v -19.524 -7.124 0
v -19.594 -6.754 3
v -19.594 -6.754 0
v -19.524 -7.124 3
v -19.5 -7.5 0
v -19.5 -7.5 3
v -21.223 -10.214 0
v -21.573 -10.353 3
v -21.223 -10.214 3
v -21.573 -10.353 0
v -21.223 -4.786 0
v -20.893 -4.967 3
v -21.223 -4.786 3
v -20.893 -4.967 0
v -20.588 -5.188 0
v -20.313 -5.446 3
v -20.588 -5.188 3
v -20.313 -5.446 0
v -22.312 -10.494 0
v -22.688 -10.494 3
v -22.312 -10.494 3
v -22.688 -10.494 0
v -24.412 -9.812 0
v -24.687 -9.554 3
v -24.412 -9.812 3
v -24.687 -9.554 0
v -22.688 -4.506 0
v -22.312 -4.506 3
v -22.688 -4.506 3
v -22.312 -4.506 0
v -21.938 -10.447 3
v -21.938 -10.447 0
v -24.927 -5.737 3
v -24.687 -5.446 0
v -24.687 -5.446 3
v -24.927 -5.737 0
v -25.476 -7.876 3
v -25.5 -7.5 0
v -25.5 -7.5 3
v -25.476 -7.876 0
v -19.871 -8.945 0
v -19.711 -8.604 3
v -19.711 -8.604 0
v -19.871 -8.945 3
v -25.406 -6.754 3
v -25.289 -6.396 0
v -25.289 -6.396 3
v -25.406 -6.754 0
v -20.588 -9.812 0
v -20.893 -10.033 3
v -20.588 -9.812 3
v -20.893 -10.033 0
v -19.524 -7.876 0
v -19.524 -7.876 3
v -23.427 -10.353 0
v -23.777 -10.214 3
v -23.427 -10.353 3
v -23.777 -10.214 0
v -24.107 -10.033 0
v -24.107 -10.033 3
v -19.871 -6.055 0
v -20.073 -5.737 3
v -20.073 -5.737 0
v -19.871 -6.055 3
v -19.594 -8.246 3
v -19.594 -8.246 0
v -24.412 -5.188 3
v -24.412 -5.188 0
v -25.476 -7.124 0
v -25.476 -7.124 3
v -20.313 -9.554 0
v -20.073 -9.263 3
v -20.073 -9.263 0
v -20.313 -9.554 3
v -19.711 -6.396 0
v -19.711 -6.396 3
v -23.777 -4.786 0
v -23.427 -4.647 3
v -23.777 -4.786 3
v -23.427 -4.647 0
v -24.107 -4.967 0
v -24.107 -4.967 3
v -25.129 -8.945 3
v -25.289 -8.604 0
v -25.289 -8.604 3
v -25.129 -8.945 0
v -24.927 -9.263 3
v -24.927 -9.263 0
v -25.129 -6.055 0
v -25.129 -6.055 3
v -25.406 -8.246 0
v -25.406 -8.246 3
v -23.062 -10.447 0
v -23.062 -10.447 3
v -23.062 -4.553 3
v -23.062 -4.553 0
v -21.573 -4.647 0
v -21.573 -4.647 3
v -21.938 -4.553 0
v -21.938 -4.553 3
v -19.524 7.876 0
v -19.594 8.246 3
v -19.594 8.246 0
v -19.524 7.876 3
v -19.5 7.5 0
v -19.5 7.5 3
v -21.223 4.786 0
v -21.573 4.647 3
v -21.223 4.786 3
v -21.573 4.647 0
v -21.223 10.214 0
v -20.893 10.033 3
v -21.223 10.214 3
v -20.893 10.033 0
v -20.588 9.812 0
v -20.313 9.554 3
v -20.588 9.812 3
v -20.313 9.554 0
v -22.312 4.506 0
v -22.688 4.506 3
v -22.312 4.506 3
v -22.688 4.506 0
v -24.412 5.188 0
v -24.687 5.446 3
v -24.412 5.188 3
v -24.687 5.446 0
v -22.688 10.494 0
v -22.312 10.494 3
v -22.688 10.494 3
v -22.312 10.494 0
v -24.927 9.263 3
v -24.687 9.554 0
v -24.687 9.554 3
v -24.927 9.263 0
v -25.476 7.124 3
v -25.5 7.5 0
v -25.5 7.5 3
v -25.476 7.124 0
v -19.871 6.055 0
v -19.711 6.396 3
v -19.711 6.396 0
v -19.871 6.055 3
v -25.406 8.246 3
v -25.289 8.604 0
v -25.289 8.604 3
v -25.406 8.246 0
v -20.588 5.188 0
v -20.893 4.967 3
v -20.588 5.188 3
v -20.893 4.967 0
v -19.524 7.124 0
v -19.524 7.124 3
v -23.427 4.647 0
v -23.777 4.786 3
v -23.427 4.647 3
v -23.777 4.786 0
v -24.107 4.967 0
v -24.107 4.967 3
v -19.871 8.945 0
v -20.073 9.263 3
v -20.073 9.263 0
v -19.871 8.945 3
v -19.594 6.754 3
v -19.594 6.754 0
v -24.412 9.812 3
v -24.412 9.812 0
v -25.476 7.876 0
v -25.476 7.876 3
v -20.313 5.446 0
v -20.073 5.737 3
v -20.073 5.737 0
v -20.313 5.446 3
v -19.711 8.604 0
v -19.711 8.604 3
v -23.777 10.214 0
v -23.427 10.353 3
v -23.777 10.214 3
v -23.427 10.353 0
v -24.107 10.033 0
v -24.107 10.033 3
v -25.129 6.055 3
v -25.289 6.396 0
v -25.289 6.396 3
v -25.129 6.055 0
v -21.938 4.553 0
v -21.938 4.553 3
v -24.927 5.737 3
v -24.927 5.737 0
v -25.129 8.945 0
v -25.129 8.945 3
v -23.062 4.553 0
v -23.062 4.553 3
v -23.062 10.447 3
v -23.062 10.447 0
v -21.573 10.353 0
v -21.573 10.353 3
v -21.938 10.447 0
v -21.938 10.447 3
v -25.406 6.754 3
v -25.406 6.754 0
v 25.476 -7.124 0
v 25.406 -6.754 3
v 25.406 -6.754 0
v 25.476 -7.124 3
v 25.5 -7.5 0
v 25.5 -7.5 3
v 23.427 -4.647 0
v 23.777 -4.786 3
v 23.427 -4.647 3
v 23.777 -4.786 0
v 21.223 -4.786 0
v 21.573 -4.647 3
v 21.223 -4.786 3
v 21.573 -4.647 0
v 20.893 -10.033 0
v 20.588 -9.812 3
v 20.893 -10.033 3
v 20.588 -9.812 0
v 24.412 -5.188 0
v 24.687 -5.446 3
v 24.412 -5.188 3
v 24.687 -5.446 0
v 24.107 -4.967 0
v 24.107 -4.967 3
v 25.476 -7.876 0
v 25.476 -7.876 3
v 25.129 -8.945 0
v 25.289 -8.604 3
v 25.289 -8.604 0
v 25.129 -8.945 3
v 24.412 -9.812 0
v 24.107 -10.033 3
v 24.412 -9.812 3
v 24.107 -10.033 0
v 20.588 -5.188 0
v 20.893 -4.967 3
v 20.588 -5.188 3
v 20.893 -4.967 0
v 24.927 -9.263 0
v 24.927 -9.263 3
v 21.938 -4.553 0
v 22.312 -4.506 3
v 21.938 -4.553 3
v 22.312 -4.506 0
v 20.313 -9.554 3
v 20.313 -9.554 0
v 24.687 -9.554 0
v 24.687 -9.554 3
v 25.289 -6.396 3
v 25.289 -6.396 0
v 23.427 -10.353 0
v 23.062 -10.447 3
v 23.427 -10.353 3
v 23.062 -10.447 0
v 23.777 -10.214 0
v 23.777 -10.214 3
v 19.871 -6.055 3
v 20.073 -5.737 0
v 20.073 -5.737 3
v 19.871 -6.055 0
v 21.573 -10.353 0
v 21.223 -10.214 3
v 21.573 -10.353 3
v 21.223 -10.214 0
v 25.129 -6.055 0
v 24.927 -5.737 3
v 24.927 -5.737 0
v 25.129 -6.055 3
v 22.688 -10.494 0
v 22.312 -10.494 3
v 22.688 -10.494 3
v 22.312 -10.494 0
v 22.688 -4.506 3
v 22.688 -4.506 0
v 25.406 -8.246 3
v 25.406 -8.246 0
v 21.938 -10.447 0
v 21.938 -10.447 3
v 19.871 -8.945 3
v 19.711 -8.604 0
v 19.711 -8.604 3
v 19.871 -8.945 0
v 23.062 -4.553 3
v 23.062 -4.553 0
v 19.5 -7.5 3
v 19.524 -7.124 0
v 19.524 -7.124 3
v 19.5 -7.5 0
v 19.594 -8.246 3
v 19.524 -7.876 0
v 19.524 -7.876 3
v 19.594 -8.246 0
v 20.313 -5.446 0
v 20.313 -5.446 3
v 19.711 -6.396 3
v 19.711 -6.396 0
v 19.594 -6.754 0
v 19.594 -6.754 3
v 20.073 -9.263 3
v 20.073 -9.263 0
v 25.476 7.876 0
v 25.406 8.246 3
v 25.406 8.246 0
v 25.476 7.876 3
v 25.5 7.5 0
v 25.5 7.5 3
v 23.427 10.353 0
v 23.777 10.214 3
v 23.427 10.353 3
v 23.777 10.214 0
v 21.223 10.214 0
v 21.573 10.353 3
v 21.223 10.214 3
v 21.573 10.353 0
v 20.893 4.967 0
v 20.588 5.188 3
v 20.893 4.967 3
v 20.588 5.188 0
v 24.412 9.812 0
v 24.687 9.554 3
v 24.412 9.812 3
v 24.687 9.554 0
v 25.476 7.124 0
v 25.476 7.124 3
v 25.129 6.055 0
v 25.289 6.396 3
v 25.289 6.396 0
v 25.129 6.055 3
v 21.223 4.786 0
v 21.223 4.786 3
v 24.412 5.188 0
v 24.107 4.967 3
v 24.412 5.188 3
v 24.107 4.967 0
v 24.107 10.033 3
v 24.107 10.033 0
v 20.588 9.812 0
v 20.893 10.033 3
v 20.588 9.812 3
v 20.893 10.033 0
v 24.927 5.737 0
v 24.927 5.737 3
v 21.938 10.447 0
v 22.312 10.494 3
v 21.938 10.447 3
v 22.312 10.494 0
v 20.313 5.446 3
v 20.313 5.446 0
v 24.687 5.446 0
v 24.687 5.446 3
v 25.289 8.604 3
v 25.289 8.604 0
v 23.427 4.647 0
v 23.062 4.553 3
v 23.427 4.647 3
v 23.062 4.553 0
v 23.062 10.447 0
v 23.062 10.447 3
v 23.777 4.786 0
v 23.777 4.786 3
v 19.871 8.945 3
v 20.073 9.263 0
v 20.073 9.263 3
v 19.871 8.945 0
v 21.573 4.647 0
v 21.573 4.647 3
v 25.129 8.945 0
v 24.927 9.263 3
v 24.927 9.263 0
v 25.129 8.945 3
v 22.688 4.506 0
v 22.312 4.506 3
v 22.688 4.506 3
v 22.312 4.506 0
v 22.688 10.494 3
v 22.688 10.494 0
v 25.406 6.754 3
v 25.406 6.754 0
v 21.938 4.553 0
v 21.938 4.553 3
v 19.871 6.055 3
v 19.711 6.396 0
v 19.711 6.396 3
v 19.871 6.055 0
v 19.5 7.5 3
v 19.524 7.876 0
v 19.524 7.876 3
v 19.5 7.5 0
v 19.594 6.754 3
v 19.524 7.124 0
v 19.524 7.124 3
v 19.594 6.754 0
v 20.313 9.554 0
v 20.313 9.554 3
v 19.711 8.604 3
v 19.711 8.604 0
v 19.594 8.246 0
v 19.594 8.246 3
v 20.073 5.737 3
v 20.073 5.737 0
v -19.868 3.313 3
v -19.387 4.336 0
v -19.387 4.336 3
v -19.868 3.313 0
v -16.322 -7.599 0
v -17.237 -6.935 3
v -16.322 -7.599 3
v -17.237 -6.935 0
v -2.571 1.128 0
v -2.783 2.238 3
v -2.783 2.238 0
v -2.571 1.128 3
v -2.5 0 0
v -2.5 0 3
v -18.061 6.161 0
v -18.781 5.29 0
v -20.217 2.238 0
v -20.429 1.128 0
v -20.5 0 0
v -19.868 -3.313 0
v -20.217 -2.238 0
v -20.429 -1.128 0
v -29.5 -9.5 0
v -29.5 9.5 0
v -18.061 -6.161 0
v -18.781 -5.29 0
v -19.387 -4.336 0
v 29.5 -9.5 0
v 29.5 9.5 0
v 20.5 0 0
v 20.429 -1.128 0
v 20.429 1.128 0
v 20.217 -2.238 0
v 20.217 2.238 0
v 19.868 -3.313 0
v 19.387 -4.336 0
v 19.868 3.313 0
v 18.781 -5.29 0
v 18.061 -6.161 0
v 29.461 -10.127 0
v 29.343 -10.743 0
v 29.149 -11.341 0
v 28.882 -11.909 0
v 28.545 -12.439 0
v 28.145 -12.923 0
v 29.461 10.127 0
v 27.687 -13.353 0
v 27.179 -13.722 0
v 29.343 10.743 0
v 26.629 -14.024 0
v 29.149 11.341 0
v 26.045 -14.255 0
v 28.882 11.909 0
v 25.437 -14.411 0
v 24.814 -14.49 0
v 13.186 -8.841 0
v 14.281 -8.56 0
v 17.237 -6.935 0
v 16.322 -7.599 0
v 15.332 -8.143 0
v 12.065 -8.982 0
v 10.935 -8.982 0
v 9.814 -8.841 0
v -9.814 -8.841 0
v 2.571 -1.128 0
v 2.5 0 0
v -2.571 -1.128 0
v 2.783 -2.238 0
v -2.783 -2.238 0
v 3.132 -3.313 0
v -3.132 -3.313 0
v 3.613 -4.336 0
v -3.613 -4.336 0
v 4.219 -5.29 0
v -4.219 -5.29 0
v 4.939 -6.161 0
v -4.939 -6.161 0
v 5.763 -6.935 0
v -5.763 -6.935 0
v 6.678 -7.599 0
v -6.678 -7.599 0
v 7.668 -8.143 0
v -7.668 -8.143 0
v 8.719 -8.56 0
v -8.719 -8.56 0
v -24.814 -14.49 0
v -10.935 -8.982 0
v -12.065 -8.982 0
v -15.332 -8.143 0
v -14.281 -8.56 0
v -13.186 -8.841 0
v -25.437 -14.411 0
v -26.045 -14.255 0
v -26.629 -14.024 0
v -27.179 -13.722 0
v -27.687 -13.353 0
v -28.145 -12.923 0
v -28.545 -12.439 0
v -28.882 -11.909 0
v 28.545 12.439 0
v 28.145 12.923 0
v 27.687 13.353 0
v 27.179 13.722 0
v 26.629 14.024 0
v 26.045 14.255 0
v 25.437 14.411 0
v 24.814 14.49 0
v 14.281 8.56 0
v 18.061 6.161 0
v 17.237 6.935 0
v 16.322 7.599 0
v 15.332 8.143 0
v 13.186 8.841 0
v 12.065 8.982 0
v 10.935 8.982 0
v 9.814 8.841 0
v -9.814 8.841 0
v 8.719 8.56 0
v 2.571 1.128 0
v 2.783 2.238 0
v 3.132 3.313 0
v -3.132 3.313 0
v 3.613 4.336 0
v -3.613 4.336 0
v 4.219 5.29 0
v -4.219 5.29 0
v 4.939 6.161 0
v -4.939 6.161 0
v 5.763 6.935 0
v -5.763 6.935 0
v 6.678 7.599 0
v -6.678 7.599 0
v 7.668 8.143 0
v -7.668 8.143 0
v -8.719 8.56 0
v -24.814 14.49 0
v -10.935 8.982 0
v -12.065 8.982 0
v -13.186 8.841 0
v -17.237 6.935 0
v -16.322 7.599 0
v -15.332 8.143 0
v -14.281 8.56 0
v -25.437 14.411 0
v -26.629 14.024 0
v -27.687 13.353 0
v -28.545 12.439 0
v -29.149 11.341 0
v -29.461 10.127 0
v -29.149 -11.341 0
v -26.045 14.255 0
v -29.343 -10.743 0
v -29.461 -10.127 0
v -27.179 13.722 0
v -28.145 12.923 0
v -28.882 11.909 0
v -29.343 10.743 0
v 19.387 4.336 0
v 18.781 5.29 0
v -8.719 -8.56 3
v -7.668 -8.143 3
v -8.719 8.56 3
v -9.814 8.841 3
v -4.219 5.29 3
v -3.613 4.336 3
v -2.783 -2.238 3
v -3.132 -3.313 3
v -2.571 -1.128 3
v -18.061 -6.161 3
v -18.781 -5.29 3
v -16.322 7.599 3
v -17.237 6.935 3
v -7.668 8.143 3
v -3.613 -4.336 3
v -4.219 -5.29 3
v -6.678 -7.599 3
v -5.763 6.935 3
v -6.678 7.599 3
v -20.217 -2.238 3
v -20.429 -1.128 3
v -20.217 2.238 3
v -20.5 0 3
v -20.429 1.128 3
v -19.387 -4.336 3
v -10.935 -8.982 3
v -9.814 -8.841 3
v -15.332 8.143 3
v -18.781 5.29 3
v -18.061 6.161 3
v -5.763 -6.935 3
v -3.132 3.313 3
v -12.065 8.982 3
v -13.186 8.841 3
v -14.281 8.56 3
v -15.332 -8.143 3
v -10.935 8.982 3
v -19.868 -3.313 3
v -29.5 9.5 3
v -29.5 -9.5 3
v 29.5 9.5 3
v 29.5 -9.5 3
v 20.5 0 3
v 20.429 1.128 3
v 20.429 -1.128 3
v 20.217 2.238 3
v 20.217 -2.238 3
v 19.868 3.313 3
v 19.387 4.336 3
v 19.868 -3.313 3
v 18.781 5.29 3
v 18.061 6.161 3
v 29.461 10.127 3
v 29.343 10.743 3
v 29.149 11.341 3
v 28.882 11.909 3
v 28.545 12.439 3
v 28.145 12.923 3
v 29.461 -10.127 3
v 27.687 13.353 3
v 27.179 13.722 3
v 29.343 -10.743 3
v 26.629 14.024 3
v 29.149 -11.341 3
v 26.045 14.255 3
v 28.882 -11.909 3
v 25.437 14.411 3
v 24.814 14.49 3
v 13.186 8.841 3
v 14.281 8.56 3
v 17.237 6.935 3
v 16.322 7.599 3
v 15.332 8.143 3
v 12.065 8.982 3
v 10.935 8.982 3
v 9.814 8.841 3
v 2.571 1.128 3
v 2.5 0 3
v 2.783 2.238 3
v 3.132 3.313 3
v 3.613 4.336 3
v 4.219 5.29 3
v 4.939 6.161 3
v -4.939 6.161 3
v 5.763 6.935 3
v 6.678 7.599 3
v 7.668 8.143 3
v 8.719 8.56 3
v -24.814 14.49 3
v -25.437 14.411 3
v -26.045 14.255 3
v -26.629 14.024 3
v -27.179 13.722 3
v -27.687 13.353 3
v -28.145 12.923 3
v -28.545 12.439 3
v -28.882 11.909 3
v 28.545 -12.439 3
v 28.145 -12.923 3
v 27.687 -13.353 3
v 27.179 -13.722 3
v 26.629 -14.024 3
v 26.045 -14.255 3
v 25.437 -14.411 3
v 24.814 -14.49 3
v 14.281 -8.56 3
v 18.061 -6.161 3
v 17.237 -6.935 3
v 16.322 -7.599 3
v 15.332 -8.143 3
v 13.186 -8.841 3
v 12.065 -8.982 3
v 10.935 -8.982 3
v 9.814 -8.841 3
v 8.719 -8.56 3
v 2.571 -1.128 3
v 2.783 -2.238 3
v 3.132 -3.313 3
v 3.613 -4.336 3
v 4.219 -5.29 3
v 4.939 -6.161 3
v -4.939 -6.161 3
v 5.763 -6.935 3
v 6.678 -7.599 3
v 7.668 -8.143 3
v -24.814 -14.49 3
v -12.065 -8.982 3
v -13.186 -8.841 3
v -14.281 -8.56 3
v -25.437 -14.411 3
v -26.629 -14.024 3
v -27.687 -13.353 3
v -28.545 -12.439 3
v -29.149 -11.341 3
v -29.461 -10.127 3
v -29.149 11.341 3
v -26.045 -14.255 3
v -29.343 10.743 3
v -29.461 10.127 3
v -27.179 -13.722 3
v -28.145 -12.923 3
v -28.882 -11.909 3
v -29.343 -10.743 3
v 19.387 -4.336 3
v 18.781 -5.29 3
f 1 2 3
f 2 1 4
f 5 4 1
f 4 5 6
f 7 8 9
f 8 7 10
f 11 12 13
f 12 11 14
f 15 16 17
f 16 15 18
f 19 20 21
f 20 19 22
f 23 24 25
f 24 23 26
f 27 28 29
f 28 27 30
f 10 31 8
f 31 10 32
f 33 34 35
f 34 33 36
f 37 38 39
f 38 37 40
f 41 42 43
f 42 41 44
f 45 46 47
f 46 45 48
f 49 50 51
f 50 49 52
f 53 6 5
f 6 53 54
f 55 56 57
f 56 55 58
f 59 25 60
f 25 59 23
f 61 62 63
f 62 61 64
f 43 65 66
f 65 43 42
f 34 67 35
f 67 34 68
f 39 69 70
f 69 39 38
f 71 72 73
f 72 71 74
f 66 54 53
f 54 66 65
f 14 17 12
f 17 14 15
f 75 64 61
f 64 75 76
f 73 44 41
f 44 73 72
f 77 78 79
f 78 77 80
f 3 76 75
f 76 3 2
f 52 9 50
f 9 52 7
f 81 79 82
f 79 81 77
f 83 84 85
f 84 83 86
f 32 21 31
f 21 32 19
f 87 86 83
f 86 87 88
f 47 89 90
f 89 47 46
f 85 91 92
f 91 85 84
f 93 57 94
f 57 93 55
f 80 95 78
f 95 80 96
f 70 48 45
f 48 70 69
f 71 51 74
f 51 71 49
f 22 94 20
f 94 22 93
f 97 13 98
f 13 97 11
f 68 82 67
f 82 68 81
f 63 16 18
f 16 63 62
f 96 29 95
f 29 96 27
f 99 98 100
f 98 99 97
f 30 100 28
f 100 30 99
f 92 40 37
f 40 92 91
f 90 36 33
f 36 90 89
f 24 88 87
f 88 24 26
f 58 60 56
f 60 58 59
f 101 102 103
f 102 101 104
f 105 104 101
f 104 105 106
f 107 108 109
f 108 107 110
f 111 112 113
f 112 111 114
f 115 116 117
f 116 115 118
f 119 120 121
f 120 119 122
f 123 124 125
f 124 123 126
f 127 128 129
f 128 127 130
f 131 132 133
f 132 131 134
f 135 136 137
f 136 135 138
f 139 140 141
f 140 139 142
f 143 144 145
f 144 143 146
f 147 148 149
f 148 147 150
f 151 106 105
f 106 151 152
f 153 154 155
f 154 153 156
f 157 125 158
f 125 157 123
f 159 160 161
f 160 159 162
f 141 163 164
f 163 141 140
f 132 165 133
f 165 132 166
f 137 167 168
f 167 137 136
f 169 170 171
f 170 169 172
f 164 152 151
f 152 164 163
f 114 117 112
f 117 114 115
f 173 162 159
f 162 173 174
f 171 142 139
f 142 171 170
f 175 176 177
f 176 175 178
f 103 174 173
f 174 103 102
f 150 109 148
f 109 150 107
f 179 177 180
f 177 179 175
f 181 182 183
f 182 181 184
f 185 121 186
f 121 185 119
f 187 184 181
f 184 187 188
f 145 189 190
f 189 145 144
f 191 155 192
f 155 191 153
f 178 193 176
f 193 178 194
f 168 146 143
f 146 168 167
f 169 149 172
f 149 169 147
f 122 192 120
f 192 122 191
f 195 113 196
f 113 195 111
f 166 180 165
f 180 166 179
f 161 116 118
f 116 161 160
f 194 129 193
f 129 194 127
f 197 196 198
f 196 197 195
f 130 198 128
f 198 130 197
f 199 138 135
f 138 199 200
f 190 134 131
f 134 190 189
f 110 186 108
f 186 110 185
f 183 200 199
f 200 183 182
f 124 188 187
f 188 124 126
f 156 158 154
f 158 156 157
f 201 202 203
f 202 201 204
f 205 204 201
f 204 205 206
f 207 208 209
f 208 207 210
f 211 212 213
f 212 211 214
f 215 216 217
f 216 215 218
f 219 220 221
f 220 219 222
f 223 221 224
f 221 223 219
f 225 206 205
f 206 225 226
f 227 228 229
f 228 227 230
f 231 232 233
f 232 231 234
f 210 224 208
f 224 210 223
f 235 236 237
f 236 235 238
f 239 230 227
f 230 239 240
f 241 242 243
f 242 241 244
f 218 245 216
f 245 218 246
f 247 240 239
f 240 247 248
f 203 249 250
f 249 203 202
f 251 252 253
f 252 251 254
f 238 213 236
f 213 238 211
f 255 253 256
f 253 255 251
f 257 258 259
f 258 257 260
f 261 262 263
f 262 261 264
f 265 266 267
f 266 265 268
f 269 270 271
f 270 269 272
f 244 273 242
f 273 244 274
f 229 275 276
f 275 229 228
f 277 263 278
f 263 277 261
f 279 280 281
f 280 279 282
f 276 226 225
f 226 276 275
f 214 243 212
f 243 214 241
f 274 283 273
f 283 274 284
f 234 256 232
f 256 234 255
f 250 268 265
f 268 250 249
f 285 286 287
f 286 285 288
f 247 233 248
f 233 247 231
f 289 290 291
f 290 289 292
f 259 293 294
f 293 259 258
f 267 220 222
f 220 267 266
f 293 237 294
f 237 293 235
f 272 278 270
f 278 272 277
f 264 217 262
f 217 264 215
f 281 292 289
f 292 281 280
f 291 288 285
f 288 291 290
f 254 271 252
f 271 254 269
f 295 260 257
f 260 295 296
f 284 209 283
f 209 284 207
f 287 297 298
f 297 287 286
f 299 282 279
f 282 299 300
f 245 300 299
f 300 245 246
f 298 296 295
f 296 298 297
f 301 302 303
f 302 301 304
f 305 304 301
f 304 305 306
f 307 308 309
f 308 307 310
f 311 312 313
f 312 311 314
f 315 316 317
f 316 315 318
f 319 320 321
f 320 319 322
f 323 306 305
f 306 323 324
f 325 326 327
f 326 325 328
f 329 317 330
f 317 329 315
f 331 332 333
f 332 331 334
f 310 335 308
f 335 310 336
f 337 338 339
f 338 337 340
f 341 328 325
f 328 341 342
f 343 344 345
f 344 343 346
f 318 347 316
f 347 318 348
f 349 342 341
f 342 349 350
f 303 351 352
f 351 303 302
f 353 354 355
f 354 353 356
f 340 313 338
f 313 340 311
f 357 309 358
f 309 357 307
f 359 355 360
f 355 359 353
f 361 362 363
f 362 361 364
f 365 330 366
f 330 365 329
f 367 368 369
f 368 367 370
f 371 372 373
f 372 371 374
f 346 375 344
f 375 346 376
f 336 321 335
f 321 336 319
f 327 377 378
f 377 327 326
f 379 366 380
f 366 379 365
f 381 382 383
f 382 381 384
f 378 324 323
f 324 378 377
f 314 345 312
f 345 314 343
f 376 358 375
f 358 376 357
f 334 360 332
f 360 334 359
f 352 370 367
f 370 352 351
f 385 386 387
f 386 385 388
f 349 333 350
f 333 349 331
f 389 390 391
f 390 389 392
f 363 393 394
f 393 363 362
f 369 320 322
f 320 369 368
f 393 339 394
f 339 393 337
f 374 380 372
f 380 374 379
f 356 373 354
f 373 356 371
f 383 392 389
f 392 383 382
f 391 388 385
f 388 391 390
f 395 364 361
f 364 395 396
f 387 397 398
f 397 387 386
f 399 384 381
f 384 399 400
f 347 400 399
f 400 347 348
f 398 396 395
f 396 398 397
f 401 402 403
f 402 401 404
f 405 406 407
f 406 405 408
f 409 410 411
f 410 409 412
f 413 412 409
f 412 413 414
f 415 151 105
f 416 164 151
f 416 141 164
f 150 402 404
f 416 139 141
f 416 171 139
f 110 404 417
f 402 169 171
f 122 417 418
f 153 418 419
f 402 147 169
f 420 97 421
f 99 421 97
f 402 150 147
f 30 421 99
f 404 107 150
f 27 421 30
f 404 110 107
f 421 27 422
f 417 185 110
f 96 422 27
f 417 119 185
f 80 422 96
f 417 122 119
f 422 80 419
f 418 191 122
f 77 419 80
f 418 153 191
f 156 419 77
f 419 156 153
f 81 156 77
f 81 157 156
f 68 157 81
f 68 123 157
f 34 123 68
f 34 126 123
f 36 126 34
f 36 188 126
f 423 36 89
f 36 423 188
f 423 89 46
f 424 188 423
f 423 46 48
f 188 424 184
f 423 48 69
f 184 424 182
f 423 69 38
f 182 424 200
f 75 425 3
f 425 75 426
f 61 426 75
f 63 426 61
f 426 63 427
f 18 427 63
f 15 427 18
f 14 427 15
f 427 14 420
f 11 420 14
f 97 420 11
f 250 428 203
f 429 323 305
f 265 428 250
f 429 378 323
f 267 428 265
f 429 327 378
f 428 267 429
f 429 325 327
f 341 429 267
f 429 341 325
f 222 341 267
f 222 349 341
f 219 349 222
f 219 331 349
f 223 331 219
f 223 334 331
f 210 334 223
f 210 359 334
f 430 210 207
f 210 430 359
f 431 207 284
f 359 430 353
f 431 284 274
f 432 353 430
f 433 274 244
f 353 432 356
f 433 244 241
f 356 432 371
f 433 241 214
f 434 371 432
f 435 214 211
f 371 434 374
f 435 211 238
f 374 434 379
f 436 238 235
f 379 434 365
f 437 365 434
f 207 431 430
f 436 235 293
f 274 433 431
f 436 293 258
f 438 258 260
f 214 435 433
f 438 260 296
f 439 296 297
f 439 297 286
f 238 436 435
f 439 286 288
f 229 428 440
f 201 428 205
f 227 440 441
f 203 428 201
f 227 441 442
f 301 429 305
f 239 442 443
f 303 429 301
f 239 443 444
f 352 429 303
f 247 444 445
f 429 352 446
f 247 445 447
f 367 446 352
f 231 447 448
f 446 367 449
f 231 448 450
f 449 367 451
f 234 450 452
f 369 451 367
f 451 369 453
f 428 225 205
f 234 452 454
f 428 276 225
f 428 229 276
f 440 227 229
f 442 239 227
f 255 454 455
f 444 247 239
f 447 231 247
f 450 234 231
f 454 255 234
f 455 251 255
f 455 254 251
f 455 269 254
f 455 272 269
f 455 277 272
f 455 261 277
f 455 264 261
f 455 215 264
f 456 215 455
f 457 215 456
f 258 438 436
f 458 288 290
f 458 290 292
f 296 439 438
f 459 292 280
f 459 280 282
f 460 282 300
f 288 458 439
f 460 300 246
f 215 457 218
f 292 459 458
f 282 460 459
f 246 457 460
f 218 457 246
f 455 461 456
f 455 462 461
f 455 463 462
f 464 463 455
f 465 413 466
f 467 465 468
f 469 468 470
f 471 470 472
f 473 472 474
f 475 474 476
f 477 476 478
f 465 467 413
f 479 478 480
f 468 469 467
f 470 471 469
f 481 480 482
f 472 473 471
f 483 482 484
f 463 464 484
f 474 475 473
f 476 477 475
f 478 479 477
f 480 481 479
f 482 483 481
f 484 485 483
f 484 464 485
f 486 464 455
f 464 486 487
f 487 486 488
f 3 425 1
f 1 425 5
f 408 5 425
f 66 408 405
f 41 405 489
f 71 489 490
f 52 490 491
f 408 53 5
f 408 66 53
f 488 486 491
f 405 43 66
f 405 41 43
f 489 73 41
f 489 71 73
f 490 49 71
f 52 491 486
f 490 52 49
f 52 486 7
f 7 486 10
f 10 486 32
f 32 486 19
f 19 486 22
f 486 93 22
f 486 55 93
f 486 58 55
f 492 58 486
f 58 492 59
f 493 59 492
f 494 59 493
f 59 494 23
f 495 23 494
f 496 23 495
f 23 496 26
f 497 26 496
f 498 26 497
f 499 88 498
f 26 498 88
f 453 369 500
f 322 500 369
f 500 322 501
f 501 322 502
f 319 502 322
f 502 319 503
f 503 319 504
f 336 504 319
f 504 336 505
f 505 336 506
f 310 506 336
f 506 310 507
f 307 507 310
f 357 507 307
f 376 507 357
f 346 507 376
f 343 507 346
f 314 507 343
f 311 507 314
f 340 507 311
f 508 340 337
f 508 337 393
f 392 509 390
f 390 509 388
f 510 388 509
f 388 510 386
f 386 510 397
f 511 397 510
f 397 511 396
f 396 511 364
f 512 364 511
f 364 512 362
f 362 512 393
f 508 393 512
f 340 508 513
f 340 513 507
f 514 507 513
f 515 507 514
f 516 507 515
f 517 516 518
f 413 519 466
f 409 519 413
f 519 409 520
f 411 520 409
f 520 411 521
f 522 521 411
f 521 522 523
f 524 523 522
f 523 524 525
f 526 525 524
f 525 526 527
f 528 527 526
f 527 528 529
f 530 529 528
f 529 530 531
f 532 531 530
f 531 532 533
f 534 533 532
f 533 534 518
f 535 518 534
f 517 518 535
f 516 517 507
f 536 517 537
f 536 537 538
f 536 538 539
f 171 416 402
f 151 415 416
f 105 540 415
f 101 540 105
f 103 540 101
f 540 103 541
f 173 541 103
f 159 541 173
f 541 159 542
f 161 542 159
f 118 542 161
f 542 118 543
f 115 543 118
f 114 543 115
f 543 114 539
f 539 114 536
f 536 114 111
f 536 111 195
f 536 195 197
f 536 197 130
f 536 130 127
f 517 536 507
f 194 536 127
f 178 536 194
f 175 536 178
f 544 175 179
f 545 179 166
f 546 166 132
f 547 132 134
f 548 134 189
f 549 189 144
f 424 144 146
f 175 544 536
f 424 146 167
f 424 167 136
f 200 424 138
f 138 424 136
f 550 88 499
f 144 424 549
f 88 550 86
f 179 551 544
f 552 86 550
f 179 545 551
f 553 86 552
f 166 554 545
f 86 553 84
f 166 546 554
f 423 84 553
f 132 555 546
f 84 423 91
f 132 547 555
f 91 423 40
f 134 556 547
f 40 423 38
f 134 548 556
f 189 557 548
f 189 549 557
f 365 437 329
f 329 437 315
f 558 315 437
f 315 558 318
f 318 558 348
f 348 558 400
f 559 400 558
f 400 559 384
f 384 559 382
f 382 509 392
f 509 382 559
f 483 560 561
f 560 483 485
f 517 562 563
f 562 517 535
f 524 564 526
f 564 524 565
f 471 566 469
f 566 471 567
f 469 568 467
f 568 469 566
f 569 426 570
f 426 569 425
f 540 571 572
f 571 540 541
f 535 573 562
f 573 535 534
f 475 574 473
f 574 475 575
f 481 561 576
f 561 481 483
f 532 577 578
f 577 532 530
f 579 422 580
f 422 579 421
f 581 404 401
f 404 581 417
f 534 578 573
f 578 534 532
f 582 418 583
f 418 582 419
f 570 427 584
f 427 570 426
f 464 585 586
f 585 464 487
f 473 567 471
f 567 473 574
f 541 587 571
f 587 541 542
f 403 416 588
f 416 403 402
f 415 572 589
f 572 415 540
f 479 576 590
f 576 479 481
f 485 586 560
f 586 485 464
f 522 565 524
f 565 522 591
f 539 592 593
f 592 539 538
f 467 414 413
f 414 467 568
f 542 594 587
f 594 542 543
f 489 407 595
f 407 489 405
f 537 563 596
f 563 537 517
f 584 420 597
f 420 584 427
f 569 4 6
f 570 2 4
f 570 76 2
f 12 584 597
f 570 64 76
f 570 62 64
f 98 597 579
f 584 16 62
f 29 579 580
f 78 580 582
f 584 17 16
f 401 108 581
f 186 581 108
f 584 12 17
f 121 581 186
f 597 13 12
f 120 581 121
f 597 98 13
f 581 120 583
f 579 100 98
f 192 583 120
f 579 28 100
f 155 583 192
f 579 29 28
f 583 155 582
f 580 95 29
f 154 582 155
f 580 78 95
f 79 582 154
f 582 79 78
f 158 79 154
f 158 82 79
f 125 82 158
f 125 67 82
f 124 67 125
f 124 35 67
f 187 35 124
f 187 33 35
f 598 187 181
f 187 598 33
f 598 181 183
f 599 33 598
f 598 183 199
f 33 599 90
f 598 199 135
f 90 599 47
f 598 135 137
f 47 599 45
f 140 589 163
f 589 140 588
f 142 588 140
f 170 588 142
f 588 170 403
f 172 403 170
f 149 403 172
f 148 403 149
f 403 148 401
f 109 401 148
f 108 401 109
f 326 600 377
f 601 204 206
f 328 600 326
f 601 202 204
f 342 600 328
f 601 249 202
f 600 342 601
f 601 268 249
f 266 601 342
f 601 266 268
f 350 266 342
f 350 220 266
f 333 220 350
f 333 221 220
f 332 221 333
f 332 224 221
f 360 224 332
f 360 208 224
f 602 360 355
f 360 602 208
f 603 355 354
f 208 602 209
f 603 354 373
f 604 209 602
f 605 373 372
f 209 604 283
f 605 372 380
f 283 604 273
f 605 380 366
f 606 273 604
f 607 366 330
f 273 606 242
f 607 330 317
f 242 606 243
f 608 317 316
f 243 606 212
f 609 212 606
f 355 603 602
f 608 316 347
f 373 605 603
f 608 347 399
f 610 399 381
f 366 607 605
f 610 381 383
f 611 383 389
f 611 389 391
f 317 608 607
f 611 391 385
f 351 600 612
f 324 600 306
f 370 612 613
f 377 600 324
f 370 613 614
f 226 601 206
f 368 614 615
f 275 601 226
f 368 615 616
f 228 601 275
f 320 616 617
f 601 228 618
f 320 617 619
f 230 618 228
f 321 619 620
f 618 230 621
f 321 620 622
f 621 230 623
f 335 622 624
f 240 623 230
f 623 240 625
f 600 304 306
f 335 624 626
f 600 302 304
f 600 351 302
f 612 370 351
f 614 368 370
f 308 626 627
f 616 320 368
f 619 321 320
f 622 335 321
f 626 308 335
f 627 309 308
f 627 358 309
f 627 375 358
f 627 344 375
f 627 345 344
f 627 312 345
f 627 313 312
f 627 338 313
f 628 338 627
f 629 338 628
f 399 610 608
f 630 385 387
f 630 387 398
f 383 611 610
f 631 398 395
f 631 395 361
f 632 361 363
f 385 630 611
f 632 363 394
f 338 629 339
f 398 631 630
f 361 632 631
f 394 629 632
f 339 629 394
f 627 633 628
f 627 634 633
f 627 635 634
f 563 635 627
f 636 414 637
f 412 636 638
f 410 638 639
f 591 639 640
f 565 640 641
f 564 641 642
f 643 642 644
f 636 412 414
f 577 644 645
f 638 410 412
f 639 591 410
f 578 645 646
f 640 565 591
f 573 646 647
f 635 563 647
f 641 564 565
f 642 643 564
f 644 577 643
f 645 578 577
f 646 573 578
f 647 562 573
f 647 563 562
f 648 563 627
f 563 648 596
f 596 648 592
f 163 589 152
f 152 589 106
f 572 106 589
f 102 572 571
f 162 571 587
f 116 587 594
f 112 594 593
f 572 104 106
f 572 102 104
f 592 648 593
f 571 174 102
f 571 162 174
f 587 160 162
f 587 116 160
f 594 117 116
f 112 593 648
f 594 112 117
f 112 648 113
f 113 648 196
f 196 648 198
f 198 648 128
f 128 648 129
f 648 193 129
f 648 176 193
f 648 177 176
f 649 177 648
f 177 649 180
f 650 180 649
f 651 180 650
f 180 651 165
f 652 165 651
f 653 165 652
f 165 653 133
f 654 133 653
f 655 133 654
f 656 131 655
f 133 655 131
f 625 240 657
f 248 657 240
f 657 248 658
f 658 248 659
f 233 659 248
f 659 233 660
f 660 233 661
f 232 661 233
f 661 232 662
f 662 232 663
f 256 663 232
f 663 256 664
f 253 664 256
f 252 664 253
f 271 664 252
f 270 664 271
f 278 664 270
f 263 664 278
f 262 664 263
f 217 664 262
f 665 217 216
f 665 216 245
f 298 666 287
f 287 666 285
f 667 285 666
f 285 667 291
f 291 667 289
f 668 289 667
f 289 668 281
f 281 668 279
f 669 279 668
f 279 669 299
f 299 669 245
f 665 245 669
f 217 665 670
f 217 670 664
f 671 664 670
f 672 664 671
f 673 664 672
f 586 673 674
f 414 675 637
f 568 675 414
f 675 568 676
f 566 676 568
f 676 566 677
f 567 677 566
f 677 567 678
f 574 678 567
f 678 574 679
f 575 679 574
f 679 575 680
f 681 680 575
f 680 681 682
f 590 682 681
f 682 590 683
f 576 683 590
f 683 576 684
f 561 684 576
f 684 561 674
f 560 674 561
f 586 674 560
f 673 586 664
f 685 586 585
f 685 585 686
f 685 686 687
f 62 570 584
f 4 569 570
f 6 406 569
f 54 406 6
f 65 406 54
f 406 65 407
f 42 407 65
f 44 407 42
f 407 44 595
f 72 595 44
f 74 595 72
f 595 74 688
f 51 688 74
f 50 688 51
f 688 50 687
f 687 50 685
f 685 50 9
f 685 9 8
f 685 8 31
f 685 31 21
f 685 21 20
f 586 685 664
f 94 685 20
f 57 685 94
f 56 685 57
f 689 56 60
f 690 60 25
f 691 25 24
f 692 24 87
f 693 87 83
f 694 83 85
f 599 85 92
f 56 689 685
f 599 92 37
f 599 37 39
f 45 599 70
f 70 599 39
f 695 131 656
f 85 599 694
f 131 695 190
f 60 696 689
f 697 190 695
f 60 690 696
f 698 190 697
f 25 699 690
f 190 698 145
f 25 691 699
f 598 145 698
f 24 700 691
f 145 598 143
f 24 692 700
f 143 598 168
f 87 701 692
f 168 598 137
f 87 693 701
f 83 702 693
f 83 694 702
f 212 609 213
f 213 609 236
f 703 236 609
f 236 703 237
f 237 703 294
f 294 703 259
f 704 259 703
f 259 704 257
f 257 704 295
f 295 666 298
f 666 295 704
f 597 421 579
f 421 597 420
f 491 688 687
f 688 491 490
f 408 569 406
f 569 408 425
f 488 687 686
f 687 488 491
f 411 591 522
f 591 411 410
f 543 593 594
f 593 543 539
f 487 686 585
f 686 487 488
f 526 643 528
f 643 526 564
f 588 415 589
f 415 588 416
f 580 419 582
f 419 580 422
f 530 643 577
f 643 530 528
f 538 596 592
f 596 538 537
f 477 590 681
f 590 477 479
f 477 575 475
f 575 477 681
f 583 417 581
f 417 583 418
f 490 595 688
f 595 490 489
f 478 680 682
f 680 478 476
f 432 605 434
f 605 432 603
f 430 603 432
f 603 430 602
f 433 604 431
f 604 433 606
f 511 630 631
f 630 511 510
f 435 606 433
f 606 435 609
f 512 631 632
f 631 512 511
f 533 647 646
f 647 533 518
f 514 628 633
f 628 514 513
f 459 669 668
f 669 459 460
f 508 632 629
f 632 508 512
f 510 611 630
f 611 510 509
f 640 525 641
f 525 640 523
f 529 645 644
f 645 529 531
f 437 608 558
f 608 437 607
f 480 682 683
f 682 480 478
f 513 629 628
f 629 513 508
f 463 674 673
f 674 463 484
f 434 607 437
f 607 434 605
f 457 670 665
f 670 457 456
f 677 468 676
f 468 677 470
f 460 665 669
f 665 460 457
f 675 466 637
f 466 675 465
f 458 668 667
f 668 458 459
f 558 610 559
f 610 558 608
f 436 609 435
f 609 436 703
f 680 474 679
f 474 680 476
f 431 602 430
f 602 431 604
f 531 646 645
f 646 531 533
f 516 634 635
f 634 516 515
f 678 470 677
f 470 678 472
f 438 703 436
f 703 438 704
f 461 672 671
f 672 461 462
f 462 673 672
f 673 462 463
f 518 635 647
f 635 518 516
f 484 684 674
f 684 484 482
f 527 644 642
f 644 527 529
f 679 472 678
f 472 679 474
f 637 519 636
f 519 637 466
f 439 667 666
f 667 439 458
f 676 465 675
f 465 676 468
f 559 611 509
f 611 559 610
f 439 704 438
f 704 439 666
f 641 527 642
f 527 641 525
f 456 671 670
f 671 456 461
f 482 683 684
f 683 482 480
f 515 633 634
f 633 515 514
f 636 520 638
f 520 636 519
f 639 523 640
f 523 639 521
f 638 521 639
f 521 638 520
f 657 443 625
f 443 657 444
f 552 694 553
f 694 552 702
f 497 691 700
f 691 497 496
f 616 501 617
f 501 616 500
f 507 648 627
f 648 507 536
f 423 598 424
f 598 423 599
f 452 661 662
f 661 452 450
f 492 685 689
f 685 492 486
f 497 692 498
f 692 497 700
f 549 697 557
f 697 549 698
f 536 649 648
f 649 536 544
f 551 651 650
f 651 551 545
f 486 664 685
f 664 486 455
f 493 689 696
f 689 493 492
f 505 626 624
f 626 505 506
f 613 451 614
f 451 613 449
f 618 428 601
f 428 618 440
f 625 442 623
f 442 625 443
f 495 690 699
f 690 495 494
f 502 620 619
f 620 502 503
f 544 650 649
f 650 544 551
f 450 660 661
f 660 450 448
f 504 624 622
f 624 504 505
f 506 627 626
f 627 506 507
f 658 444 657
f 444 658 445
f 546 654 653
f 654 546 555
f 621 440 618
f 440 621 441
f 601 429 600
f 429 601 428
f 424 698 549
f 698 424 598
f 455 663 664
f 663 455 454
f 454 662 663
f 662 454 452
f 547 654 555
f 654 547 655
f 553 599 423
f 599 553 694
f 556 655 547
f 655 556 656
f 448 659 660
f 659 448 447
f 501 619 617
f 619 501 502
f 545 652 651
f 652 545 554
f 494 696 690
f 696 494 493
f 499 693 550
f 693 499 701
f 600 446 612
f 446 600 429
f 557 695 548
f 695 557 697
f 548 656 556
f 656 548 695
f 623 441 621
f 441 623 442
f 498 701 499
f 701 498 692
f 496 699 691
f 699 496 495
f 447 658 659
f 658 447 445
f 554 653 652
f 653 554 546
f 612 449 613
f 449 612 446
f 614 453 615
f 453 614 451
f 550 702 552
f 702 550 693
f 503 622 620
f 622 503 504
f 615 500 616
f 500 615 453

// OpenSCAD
$fn = 50;


difference() {
	union() {
		hull() {
			translate(v = [-24.5000000000, 9.5000000000, 0]) {
				cylinder(h = 3, r = 5);
			}
			translate(v = [24.5000000000, 9.5000000000, 0]) {
				cylinder(h = 3, r = 5);
			}
			translate(v = [-24.5000000000, -9.5000000000, 0]) {
				cylinder(h = 3, r = 5);
			}
			translate(v = [24.5000000000, -9.5000000000, 0]) {
				cylinder(h = 3, r = 5);
			}
		}
	}
	union() {
		#translate(v = [-22.5000000000, -7.5000000000, -100.0000000000]) {
			cylinder(h = 200, r = 3.0000000000);
		}
		#translate(v = [-22.5000000000, 7.5000000000, -100.0000000000]) {
			cylinder(h = 200, r = 3.0000000000);
		}
		#translate(v = [22.5000000000, -7.5000000000, -100.0000000000]) {
			cylinder(h = 200, r = 3.0000000000);
		}
		#translate(v = [22.5000000000, 7.5000000000, -100.0000000000]) {
			cylinder(h = 200, r = 3.0000000000);
		}
		#translate(v = [-11.5000000000, 0, 0]) {
			cylinder(h = 3, r = 9.0000000000);
		}
		#translate(v = [11.5000000000, 0, 0]) {
			cylinder(h = 3, r = 9.0000000000);
		}
	}
}
